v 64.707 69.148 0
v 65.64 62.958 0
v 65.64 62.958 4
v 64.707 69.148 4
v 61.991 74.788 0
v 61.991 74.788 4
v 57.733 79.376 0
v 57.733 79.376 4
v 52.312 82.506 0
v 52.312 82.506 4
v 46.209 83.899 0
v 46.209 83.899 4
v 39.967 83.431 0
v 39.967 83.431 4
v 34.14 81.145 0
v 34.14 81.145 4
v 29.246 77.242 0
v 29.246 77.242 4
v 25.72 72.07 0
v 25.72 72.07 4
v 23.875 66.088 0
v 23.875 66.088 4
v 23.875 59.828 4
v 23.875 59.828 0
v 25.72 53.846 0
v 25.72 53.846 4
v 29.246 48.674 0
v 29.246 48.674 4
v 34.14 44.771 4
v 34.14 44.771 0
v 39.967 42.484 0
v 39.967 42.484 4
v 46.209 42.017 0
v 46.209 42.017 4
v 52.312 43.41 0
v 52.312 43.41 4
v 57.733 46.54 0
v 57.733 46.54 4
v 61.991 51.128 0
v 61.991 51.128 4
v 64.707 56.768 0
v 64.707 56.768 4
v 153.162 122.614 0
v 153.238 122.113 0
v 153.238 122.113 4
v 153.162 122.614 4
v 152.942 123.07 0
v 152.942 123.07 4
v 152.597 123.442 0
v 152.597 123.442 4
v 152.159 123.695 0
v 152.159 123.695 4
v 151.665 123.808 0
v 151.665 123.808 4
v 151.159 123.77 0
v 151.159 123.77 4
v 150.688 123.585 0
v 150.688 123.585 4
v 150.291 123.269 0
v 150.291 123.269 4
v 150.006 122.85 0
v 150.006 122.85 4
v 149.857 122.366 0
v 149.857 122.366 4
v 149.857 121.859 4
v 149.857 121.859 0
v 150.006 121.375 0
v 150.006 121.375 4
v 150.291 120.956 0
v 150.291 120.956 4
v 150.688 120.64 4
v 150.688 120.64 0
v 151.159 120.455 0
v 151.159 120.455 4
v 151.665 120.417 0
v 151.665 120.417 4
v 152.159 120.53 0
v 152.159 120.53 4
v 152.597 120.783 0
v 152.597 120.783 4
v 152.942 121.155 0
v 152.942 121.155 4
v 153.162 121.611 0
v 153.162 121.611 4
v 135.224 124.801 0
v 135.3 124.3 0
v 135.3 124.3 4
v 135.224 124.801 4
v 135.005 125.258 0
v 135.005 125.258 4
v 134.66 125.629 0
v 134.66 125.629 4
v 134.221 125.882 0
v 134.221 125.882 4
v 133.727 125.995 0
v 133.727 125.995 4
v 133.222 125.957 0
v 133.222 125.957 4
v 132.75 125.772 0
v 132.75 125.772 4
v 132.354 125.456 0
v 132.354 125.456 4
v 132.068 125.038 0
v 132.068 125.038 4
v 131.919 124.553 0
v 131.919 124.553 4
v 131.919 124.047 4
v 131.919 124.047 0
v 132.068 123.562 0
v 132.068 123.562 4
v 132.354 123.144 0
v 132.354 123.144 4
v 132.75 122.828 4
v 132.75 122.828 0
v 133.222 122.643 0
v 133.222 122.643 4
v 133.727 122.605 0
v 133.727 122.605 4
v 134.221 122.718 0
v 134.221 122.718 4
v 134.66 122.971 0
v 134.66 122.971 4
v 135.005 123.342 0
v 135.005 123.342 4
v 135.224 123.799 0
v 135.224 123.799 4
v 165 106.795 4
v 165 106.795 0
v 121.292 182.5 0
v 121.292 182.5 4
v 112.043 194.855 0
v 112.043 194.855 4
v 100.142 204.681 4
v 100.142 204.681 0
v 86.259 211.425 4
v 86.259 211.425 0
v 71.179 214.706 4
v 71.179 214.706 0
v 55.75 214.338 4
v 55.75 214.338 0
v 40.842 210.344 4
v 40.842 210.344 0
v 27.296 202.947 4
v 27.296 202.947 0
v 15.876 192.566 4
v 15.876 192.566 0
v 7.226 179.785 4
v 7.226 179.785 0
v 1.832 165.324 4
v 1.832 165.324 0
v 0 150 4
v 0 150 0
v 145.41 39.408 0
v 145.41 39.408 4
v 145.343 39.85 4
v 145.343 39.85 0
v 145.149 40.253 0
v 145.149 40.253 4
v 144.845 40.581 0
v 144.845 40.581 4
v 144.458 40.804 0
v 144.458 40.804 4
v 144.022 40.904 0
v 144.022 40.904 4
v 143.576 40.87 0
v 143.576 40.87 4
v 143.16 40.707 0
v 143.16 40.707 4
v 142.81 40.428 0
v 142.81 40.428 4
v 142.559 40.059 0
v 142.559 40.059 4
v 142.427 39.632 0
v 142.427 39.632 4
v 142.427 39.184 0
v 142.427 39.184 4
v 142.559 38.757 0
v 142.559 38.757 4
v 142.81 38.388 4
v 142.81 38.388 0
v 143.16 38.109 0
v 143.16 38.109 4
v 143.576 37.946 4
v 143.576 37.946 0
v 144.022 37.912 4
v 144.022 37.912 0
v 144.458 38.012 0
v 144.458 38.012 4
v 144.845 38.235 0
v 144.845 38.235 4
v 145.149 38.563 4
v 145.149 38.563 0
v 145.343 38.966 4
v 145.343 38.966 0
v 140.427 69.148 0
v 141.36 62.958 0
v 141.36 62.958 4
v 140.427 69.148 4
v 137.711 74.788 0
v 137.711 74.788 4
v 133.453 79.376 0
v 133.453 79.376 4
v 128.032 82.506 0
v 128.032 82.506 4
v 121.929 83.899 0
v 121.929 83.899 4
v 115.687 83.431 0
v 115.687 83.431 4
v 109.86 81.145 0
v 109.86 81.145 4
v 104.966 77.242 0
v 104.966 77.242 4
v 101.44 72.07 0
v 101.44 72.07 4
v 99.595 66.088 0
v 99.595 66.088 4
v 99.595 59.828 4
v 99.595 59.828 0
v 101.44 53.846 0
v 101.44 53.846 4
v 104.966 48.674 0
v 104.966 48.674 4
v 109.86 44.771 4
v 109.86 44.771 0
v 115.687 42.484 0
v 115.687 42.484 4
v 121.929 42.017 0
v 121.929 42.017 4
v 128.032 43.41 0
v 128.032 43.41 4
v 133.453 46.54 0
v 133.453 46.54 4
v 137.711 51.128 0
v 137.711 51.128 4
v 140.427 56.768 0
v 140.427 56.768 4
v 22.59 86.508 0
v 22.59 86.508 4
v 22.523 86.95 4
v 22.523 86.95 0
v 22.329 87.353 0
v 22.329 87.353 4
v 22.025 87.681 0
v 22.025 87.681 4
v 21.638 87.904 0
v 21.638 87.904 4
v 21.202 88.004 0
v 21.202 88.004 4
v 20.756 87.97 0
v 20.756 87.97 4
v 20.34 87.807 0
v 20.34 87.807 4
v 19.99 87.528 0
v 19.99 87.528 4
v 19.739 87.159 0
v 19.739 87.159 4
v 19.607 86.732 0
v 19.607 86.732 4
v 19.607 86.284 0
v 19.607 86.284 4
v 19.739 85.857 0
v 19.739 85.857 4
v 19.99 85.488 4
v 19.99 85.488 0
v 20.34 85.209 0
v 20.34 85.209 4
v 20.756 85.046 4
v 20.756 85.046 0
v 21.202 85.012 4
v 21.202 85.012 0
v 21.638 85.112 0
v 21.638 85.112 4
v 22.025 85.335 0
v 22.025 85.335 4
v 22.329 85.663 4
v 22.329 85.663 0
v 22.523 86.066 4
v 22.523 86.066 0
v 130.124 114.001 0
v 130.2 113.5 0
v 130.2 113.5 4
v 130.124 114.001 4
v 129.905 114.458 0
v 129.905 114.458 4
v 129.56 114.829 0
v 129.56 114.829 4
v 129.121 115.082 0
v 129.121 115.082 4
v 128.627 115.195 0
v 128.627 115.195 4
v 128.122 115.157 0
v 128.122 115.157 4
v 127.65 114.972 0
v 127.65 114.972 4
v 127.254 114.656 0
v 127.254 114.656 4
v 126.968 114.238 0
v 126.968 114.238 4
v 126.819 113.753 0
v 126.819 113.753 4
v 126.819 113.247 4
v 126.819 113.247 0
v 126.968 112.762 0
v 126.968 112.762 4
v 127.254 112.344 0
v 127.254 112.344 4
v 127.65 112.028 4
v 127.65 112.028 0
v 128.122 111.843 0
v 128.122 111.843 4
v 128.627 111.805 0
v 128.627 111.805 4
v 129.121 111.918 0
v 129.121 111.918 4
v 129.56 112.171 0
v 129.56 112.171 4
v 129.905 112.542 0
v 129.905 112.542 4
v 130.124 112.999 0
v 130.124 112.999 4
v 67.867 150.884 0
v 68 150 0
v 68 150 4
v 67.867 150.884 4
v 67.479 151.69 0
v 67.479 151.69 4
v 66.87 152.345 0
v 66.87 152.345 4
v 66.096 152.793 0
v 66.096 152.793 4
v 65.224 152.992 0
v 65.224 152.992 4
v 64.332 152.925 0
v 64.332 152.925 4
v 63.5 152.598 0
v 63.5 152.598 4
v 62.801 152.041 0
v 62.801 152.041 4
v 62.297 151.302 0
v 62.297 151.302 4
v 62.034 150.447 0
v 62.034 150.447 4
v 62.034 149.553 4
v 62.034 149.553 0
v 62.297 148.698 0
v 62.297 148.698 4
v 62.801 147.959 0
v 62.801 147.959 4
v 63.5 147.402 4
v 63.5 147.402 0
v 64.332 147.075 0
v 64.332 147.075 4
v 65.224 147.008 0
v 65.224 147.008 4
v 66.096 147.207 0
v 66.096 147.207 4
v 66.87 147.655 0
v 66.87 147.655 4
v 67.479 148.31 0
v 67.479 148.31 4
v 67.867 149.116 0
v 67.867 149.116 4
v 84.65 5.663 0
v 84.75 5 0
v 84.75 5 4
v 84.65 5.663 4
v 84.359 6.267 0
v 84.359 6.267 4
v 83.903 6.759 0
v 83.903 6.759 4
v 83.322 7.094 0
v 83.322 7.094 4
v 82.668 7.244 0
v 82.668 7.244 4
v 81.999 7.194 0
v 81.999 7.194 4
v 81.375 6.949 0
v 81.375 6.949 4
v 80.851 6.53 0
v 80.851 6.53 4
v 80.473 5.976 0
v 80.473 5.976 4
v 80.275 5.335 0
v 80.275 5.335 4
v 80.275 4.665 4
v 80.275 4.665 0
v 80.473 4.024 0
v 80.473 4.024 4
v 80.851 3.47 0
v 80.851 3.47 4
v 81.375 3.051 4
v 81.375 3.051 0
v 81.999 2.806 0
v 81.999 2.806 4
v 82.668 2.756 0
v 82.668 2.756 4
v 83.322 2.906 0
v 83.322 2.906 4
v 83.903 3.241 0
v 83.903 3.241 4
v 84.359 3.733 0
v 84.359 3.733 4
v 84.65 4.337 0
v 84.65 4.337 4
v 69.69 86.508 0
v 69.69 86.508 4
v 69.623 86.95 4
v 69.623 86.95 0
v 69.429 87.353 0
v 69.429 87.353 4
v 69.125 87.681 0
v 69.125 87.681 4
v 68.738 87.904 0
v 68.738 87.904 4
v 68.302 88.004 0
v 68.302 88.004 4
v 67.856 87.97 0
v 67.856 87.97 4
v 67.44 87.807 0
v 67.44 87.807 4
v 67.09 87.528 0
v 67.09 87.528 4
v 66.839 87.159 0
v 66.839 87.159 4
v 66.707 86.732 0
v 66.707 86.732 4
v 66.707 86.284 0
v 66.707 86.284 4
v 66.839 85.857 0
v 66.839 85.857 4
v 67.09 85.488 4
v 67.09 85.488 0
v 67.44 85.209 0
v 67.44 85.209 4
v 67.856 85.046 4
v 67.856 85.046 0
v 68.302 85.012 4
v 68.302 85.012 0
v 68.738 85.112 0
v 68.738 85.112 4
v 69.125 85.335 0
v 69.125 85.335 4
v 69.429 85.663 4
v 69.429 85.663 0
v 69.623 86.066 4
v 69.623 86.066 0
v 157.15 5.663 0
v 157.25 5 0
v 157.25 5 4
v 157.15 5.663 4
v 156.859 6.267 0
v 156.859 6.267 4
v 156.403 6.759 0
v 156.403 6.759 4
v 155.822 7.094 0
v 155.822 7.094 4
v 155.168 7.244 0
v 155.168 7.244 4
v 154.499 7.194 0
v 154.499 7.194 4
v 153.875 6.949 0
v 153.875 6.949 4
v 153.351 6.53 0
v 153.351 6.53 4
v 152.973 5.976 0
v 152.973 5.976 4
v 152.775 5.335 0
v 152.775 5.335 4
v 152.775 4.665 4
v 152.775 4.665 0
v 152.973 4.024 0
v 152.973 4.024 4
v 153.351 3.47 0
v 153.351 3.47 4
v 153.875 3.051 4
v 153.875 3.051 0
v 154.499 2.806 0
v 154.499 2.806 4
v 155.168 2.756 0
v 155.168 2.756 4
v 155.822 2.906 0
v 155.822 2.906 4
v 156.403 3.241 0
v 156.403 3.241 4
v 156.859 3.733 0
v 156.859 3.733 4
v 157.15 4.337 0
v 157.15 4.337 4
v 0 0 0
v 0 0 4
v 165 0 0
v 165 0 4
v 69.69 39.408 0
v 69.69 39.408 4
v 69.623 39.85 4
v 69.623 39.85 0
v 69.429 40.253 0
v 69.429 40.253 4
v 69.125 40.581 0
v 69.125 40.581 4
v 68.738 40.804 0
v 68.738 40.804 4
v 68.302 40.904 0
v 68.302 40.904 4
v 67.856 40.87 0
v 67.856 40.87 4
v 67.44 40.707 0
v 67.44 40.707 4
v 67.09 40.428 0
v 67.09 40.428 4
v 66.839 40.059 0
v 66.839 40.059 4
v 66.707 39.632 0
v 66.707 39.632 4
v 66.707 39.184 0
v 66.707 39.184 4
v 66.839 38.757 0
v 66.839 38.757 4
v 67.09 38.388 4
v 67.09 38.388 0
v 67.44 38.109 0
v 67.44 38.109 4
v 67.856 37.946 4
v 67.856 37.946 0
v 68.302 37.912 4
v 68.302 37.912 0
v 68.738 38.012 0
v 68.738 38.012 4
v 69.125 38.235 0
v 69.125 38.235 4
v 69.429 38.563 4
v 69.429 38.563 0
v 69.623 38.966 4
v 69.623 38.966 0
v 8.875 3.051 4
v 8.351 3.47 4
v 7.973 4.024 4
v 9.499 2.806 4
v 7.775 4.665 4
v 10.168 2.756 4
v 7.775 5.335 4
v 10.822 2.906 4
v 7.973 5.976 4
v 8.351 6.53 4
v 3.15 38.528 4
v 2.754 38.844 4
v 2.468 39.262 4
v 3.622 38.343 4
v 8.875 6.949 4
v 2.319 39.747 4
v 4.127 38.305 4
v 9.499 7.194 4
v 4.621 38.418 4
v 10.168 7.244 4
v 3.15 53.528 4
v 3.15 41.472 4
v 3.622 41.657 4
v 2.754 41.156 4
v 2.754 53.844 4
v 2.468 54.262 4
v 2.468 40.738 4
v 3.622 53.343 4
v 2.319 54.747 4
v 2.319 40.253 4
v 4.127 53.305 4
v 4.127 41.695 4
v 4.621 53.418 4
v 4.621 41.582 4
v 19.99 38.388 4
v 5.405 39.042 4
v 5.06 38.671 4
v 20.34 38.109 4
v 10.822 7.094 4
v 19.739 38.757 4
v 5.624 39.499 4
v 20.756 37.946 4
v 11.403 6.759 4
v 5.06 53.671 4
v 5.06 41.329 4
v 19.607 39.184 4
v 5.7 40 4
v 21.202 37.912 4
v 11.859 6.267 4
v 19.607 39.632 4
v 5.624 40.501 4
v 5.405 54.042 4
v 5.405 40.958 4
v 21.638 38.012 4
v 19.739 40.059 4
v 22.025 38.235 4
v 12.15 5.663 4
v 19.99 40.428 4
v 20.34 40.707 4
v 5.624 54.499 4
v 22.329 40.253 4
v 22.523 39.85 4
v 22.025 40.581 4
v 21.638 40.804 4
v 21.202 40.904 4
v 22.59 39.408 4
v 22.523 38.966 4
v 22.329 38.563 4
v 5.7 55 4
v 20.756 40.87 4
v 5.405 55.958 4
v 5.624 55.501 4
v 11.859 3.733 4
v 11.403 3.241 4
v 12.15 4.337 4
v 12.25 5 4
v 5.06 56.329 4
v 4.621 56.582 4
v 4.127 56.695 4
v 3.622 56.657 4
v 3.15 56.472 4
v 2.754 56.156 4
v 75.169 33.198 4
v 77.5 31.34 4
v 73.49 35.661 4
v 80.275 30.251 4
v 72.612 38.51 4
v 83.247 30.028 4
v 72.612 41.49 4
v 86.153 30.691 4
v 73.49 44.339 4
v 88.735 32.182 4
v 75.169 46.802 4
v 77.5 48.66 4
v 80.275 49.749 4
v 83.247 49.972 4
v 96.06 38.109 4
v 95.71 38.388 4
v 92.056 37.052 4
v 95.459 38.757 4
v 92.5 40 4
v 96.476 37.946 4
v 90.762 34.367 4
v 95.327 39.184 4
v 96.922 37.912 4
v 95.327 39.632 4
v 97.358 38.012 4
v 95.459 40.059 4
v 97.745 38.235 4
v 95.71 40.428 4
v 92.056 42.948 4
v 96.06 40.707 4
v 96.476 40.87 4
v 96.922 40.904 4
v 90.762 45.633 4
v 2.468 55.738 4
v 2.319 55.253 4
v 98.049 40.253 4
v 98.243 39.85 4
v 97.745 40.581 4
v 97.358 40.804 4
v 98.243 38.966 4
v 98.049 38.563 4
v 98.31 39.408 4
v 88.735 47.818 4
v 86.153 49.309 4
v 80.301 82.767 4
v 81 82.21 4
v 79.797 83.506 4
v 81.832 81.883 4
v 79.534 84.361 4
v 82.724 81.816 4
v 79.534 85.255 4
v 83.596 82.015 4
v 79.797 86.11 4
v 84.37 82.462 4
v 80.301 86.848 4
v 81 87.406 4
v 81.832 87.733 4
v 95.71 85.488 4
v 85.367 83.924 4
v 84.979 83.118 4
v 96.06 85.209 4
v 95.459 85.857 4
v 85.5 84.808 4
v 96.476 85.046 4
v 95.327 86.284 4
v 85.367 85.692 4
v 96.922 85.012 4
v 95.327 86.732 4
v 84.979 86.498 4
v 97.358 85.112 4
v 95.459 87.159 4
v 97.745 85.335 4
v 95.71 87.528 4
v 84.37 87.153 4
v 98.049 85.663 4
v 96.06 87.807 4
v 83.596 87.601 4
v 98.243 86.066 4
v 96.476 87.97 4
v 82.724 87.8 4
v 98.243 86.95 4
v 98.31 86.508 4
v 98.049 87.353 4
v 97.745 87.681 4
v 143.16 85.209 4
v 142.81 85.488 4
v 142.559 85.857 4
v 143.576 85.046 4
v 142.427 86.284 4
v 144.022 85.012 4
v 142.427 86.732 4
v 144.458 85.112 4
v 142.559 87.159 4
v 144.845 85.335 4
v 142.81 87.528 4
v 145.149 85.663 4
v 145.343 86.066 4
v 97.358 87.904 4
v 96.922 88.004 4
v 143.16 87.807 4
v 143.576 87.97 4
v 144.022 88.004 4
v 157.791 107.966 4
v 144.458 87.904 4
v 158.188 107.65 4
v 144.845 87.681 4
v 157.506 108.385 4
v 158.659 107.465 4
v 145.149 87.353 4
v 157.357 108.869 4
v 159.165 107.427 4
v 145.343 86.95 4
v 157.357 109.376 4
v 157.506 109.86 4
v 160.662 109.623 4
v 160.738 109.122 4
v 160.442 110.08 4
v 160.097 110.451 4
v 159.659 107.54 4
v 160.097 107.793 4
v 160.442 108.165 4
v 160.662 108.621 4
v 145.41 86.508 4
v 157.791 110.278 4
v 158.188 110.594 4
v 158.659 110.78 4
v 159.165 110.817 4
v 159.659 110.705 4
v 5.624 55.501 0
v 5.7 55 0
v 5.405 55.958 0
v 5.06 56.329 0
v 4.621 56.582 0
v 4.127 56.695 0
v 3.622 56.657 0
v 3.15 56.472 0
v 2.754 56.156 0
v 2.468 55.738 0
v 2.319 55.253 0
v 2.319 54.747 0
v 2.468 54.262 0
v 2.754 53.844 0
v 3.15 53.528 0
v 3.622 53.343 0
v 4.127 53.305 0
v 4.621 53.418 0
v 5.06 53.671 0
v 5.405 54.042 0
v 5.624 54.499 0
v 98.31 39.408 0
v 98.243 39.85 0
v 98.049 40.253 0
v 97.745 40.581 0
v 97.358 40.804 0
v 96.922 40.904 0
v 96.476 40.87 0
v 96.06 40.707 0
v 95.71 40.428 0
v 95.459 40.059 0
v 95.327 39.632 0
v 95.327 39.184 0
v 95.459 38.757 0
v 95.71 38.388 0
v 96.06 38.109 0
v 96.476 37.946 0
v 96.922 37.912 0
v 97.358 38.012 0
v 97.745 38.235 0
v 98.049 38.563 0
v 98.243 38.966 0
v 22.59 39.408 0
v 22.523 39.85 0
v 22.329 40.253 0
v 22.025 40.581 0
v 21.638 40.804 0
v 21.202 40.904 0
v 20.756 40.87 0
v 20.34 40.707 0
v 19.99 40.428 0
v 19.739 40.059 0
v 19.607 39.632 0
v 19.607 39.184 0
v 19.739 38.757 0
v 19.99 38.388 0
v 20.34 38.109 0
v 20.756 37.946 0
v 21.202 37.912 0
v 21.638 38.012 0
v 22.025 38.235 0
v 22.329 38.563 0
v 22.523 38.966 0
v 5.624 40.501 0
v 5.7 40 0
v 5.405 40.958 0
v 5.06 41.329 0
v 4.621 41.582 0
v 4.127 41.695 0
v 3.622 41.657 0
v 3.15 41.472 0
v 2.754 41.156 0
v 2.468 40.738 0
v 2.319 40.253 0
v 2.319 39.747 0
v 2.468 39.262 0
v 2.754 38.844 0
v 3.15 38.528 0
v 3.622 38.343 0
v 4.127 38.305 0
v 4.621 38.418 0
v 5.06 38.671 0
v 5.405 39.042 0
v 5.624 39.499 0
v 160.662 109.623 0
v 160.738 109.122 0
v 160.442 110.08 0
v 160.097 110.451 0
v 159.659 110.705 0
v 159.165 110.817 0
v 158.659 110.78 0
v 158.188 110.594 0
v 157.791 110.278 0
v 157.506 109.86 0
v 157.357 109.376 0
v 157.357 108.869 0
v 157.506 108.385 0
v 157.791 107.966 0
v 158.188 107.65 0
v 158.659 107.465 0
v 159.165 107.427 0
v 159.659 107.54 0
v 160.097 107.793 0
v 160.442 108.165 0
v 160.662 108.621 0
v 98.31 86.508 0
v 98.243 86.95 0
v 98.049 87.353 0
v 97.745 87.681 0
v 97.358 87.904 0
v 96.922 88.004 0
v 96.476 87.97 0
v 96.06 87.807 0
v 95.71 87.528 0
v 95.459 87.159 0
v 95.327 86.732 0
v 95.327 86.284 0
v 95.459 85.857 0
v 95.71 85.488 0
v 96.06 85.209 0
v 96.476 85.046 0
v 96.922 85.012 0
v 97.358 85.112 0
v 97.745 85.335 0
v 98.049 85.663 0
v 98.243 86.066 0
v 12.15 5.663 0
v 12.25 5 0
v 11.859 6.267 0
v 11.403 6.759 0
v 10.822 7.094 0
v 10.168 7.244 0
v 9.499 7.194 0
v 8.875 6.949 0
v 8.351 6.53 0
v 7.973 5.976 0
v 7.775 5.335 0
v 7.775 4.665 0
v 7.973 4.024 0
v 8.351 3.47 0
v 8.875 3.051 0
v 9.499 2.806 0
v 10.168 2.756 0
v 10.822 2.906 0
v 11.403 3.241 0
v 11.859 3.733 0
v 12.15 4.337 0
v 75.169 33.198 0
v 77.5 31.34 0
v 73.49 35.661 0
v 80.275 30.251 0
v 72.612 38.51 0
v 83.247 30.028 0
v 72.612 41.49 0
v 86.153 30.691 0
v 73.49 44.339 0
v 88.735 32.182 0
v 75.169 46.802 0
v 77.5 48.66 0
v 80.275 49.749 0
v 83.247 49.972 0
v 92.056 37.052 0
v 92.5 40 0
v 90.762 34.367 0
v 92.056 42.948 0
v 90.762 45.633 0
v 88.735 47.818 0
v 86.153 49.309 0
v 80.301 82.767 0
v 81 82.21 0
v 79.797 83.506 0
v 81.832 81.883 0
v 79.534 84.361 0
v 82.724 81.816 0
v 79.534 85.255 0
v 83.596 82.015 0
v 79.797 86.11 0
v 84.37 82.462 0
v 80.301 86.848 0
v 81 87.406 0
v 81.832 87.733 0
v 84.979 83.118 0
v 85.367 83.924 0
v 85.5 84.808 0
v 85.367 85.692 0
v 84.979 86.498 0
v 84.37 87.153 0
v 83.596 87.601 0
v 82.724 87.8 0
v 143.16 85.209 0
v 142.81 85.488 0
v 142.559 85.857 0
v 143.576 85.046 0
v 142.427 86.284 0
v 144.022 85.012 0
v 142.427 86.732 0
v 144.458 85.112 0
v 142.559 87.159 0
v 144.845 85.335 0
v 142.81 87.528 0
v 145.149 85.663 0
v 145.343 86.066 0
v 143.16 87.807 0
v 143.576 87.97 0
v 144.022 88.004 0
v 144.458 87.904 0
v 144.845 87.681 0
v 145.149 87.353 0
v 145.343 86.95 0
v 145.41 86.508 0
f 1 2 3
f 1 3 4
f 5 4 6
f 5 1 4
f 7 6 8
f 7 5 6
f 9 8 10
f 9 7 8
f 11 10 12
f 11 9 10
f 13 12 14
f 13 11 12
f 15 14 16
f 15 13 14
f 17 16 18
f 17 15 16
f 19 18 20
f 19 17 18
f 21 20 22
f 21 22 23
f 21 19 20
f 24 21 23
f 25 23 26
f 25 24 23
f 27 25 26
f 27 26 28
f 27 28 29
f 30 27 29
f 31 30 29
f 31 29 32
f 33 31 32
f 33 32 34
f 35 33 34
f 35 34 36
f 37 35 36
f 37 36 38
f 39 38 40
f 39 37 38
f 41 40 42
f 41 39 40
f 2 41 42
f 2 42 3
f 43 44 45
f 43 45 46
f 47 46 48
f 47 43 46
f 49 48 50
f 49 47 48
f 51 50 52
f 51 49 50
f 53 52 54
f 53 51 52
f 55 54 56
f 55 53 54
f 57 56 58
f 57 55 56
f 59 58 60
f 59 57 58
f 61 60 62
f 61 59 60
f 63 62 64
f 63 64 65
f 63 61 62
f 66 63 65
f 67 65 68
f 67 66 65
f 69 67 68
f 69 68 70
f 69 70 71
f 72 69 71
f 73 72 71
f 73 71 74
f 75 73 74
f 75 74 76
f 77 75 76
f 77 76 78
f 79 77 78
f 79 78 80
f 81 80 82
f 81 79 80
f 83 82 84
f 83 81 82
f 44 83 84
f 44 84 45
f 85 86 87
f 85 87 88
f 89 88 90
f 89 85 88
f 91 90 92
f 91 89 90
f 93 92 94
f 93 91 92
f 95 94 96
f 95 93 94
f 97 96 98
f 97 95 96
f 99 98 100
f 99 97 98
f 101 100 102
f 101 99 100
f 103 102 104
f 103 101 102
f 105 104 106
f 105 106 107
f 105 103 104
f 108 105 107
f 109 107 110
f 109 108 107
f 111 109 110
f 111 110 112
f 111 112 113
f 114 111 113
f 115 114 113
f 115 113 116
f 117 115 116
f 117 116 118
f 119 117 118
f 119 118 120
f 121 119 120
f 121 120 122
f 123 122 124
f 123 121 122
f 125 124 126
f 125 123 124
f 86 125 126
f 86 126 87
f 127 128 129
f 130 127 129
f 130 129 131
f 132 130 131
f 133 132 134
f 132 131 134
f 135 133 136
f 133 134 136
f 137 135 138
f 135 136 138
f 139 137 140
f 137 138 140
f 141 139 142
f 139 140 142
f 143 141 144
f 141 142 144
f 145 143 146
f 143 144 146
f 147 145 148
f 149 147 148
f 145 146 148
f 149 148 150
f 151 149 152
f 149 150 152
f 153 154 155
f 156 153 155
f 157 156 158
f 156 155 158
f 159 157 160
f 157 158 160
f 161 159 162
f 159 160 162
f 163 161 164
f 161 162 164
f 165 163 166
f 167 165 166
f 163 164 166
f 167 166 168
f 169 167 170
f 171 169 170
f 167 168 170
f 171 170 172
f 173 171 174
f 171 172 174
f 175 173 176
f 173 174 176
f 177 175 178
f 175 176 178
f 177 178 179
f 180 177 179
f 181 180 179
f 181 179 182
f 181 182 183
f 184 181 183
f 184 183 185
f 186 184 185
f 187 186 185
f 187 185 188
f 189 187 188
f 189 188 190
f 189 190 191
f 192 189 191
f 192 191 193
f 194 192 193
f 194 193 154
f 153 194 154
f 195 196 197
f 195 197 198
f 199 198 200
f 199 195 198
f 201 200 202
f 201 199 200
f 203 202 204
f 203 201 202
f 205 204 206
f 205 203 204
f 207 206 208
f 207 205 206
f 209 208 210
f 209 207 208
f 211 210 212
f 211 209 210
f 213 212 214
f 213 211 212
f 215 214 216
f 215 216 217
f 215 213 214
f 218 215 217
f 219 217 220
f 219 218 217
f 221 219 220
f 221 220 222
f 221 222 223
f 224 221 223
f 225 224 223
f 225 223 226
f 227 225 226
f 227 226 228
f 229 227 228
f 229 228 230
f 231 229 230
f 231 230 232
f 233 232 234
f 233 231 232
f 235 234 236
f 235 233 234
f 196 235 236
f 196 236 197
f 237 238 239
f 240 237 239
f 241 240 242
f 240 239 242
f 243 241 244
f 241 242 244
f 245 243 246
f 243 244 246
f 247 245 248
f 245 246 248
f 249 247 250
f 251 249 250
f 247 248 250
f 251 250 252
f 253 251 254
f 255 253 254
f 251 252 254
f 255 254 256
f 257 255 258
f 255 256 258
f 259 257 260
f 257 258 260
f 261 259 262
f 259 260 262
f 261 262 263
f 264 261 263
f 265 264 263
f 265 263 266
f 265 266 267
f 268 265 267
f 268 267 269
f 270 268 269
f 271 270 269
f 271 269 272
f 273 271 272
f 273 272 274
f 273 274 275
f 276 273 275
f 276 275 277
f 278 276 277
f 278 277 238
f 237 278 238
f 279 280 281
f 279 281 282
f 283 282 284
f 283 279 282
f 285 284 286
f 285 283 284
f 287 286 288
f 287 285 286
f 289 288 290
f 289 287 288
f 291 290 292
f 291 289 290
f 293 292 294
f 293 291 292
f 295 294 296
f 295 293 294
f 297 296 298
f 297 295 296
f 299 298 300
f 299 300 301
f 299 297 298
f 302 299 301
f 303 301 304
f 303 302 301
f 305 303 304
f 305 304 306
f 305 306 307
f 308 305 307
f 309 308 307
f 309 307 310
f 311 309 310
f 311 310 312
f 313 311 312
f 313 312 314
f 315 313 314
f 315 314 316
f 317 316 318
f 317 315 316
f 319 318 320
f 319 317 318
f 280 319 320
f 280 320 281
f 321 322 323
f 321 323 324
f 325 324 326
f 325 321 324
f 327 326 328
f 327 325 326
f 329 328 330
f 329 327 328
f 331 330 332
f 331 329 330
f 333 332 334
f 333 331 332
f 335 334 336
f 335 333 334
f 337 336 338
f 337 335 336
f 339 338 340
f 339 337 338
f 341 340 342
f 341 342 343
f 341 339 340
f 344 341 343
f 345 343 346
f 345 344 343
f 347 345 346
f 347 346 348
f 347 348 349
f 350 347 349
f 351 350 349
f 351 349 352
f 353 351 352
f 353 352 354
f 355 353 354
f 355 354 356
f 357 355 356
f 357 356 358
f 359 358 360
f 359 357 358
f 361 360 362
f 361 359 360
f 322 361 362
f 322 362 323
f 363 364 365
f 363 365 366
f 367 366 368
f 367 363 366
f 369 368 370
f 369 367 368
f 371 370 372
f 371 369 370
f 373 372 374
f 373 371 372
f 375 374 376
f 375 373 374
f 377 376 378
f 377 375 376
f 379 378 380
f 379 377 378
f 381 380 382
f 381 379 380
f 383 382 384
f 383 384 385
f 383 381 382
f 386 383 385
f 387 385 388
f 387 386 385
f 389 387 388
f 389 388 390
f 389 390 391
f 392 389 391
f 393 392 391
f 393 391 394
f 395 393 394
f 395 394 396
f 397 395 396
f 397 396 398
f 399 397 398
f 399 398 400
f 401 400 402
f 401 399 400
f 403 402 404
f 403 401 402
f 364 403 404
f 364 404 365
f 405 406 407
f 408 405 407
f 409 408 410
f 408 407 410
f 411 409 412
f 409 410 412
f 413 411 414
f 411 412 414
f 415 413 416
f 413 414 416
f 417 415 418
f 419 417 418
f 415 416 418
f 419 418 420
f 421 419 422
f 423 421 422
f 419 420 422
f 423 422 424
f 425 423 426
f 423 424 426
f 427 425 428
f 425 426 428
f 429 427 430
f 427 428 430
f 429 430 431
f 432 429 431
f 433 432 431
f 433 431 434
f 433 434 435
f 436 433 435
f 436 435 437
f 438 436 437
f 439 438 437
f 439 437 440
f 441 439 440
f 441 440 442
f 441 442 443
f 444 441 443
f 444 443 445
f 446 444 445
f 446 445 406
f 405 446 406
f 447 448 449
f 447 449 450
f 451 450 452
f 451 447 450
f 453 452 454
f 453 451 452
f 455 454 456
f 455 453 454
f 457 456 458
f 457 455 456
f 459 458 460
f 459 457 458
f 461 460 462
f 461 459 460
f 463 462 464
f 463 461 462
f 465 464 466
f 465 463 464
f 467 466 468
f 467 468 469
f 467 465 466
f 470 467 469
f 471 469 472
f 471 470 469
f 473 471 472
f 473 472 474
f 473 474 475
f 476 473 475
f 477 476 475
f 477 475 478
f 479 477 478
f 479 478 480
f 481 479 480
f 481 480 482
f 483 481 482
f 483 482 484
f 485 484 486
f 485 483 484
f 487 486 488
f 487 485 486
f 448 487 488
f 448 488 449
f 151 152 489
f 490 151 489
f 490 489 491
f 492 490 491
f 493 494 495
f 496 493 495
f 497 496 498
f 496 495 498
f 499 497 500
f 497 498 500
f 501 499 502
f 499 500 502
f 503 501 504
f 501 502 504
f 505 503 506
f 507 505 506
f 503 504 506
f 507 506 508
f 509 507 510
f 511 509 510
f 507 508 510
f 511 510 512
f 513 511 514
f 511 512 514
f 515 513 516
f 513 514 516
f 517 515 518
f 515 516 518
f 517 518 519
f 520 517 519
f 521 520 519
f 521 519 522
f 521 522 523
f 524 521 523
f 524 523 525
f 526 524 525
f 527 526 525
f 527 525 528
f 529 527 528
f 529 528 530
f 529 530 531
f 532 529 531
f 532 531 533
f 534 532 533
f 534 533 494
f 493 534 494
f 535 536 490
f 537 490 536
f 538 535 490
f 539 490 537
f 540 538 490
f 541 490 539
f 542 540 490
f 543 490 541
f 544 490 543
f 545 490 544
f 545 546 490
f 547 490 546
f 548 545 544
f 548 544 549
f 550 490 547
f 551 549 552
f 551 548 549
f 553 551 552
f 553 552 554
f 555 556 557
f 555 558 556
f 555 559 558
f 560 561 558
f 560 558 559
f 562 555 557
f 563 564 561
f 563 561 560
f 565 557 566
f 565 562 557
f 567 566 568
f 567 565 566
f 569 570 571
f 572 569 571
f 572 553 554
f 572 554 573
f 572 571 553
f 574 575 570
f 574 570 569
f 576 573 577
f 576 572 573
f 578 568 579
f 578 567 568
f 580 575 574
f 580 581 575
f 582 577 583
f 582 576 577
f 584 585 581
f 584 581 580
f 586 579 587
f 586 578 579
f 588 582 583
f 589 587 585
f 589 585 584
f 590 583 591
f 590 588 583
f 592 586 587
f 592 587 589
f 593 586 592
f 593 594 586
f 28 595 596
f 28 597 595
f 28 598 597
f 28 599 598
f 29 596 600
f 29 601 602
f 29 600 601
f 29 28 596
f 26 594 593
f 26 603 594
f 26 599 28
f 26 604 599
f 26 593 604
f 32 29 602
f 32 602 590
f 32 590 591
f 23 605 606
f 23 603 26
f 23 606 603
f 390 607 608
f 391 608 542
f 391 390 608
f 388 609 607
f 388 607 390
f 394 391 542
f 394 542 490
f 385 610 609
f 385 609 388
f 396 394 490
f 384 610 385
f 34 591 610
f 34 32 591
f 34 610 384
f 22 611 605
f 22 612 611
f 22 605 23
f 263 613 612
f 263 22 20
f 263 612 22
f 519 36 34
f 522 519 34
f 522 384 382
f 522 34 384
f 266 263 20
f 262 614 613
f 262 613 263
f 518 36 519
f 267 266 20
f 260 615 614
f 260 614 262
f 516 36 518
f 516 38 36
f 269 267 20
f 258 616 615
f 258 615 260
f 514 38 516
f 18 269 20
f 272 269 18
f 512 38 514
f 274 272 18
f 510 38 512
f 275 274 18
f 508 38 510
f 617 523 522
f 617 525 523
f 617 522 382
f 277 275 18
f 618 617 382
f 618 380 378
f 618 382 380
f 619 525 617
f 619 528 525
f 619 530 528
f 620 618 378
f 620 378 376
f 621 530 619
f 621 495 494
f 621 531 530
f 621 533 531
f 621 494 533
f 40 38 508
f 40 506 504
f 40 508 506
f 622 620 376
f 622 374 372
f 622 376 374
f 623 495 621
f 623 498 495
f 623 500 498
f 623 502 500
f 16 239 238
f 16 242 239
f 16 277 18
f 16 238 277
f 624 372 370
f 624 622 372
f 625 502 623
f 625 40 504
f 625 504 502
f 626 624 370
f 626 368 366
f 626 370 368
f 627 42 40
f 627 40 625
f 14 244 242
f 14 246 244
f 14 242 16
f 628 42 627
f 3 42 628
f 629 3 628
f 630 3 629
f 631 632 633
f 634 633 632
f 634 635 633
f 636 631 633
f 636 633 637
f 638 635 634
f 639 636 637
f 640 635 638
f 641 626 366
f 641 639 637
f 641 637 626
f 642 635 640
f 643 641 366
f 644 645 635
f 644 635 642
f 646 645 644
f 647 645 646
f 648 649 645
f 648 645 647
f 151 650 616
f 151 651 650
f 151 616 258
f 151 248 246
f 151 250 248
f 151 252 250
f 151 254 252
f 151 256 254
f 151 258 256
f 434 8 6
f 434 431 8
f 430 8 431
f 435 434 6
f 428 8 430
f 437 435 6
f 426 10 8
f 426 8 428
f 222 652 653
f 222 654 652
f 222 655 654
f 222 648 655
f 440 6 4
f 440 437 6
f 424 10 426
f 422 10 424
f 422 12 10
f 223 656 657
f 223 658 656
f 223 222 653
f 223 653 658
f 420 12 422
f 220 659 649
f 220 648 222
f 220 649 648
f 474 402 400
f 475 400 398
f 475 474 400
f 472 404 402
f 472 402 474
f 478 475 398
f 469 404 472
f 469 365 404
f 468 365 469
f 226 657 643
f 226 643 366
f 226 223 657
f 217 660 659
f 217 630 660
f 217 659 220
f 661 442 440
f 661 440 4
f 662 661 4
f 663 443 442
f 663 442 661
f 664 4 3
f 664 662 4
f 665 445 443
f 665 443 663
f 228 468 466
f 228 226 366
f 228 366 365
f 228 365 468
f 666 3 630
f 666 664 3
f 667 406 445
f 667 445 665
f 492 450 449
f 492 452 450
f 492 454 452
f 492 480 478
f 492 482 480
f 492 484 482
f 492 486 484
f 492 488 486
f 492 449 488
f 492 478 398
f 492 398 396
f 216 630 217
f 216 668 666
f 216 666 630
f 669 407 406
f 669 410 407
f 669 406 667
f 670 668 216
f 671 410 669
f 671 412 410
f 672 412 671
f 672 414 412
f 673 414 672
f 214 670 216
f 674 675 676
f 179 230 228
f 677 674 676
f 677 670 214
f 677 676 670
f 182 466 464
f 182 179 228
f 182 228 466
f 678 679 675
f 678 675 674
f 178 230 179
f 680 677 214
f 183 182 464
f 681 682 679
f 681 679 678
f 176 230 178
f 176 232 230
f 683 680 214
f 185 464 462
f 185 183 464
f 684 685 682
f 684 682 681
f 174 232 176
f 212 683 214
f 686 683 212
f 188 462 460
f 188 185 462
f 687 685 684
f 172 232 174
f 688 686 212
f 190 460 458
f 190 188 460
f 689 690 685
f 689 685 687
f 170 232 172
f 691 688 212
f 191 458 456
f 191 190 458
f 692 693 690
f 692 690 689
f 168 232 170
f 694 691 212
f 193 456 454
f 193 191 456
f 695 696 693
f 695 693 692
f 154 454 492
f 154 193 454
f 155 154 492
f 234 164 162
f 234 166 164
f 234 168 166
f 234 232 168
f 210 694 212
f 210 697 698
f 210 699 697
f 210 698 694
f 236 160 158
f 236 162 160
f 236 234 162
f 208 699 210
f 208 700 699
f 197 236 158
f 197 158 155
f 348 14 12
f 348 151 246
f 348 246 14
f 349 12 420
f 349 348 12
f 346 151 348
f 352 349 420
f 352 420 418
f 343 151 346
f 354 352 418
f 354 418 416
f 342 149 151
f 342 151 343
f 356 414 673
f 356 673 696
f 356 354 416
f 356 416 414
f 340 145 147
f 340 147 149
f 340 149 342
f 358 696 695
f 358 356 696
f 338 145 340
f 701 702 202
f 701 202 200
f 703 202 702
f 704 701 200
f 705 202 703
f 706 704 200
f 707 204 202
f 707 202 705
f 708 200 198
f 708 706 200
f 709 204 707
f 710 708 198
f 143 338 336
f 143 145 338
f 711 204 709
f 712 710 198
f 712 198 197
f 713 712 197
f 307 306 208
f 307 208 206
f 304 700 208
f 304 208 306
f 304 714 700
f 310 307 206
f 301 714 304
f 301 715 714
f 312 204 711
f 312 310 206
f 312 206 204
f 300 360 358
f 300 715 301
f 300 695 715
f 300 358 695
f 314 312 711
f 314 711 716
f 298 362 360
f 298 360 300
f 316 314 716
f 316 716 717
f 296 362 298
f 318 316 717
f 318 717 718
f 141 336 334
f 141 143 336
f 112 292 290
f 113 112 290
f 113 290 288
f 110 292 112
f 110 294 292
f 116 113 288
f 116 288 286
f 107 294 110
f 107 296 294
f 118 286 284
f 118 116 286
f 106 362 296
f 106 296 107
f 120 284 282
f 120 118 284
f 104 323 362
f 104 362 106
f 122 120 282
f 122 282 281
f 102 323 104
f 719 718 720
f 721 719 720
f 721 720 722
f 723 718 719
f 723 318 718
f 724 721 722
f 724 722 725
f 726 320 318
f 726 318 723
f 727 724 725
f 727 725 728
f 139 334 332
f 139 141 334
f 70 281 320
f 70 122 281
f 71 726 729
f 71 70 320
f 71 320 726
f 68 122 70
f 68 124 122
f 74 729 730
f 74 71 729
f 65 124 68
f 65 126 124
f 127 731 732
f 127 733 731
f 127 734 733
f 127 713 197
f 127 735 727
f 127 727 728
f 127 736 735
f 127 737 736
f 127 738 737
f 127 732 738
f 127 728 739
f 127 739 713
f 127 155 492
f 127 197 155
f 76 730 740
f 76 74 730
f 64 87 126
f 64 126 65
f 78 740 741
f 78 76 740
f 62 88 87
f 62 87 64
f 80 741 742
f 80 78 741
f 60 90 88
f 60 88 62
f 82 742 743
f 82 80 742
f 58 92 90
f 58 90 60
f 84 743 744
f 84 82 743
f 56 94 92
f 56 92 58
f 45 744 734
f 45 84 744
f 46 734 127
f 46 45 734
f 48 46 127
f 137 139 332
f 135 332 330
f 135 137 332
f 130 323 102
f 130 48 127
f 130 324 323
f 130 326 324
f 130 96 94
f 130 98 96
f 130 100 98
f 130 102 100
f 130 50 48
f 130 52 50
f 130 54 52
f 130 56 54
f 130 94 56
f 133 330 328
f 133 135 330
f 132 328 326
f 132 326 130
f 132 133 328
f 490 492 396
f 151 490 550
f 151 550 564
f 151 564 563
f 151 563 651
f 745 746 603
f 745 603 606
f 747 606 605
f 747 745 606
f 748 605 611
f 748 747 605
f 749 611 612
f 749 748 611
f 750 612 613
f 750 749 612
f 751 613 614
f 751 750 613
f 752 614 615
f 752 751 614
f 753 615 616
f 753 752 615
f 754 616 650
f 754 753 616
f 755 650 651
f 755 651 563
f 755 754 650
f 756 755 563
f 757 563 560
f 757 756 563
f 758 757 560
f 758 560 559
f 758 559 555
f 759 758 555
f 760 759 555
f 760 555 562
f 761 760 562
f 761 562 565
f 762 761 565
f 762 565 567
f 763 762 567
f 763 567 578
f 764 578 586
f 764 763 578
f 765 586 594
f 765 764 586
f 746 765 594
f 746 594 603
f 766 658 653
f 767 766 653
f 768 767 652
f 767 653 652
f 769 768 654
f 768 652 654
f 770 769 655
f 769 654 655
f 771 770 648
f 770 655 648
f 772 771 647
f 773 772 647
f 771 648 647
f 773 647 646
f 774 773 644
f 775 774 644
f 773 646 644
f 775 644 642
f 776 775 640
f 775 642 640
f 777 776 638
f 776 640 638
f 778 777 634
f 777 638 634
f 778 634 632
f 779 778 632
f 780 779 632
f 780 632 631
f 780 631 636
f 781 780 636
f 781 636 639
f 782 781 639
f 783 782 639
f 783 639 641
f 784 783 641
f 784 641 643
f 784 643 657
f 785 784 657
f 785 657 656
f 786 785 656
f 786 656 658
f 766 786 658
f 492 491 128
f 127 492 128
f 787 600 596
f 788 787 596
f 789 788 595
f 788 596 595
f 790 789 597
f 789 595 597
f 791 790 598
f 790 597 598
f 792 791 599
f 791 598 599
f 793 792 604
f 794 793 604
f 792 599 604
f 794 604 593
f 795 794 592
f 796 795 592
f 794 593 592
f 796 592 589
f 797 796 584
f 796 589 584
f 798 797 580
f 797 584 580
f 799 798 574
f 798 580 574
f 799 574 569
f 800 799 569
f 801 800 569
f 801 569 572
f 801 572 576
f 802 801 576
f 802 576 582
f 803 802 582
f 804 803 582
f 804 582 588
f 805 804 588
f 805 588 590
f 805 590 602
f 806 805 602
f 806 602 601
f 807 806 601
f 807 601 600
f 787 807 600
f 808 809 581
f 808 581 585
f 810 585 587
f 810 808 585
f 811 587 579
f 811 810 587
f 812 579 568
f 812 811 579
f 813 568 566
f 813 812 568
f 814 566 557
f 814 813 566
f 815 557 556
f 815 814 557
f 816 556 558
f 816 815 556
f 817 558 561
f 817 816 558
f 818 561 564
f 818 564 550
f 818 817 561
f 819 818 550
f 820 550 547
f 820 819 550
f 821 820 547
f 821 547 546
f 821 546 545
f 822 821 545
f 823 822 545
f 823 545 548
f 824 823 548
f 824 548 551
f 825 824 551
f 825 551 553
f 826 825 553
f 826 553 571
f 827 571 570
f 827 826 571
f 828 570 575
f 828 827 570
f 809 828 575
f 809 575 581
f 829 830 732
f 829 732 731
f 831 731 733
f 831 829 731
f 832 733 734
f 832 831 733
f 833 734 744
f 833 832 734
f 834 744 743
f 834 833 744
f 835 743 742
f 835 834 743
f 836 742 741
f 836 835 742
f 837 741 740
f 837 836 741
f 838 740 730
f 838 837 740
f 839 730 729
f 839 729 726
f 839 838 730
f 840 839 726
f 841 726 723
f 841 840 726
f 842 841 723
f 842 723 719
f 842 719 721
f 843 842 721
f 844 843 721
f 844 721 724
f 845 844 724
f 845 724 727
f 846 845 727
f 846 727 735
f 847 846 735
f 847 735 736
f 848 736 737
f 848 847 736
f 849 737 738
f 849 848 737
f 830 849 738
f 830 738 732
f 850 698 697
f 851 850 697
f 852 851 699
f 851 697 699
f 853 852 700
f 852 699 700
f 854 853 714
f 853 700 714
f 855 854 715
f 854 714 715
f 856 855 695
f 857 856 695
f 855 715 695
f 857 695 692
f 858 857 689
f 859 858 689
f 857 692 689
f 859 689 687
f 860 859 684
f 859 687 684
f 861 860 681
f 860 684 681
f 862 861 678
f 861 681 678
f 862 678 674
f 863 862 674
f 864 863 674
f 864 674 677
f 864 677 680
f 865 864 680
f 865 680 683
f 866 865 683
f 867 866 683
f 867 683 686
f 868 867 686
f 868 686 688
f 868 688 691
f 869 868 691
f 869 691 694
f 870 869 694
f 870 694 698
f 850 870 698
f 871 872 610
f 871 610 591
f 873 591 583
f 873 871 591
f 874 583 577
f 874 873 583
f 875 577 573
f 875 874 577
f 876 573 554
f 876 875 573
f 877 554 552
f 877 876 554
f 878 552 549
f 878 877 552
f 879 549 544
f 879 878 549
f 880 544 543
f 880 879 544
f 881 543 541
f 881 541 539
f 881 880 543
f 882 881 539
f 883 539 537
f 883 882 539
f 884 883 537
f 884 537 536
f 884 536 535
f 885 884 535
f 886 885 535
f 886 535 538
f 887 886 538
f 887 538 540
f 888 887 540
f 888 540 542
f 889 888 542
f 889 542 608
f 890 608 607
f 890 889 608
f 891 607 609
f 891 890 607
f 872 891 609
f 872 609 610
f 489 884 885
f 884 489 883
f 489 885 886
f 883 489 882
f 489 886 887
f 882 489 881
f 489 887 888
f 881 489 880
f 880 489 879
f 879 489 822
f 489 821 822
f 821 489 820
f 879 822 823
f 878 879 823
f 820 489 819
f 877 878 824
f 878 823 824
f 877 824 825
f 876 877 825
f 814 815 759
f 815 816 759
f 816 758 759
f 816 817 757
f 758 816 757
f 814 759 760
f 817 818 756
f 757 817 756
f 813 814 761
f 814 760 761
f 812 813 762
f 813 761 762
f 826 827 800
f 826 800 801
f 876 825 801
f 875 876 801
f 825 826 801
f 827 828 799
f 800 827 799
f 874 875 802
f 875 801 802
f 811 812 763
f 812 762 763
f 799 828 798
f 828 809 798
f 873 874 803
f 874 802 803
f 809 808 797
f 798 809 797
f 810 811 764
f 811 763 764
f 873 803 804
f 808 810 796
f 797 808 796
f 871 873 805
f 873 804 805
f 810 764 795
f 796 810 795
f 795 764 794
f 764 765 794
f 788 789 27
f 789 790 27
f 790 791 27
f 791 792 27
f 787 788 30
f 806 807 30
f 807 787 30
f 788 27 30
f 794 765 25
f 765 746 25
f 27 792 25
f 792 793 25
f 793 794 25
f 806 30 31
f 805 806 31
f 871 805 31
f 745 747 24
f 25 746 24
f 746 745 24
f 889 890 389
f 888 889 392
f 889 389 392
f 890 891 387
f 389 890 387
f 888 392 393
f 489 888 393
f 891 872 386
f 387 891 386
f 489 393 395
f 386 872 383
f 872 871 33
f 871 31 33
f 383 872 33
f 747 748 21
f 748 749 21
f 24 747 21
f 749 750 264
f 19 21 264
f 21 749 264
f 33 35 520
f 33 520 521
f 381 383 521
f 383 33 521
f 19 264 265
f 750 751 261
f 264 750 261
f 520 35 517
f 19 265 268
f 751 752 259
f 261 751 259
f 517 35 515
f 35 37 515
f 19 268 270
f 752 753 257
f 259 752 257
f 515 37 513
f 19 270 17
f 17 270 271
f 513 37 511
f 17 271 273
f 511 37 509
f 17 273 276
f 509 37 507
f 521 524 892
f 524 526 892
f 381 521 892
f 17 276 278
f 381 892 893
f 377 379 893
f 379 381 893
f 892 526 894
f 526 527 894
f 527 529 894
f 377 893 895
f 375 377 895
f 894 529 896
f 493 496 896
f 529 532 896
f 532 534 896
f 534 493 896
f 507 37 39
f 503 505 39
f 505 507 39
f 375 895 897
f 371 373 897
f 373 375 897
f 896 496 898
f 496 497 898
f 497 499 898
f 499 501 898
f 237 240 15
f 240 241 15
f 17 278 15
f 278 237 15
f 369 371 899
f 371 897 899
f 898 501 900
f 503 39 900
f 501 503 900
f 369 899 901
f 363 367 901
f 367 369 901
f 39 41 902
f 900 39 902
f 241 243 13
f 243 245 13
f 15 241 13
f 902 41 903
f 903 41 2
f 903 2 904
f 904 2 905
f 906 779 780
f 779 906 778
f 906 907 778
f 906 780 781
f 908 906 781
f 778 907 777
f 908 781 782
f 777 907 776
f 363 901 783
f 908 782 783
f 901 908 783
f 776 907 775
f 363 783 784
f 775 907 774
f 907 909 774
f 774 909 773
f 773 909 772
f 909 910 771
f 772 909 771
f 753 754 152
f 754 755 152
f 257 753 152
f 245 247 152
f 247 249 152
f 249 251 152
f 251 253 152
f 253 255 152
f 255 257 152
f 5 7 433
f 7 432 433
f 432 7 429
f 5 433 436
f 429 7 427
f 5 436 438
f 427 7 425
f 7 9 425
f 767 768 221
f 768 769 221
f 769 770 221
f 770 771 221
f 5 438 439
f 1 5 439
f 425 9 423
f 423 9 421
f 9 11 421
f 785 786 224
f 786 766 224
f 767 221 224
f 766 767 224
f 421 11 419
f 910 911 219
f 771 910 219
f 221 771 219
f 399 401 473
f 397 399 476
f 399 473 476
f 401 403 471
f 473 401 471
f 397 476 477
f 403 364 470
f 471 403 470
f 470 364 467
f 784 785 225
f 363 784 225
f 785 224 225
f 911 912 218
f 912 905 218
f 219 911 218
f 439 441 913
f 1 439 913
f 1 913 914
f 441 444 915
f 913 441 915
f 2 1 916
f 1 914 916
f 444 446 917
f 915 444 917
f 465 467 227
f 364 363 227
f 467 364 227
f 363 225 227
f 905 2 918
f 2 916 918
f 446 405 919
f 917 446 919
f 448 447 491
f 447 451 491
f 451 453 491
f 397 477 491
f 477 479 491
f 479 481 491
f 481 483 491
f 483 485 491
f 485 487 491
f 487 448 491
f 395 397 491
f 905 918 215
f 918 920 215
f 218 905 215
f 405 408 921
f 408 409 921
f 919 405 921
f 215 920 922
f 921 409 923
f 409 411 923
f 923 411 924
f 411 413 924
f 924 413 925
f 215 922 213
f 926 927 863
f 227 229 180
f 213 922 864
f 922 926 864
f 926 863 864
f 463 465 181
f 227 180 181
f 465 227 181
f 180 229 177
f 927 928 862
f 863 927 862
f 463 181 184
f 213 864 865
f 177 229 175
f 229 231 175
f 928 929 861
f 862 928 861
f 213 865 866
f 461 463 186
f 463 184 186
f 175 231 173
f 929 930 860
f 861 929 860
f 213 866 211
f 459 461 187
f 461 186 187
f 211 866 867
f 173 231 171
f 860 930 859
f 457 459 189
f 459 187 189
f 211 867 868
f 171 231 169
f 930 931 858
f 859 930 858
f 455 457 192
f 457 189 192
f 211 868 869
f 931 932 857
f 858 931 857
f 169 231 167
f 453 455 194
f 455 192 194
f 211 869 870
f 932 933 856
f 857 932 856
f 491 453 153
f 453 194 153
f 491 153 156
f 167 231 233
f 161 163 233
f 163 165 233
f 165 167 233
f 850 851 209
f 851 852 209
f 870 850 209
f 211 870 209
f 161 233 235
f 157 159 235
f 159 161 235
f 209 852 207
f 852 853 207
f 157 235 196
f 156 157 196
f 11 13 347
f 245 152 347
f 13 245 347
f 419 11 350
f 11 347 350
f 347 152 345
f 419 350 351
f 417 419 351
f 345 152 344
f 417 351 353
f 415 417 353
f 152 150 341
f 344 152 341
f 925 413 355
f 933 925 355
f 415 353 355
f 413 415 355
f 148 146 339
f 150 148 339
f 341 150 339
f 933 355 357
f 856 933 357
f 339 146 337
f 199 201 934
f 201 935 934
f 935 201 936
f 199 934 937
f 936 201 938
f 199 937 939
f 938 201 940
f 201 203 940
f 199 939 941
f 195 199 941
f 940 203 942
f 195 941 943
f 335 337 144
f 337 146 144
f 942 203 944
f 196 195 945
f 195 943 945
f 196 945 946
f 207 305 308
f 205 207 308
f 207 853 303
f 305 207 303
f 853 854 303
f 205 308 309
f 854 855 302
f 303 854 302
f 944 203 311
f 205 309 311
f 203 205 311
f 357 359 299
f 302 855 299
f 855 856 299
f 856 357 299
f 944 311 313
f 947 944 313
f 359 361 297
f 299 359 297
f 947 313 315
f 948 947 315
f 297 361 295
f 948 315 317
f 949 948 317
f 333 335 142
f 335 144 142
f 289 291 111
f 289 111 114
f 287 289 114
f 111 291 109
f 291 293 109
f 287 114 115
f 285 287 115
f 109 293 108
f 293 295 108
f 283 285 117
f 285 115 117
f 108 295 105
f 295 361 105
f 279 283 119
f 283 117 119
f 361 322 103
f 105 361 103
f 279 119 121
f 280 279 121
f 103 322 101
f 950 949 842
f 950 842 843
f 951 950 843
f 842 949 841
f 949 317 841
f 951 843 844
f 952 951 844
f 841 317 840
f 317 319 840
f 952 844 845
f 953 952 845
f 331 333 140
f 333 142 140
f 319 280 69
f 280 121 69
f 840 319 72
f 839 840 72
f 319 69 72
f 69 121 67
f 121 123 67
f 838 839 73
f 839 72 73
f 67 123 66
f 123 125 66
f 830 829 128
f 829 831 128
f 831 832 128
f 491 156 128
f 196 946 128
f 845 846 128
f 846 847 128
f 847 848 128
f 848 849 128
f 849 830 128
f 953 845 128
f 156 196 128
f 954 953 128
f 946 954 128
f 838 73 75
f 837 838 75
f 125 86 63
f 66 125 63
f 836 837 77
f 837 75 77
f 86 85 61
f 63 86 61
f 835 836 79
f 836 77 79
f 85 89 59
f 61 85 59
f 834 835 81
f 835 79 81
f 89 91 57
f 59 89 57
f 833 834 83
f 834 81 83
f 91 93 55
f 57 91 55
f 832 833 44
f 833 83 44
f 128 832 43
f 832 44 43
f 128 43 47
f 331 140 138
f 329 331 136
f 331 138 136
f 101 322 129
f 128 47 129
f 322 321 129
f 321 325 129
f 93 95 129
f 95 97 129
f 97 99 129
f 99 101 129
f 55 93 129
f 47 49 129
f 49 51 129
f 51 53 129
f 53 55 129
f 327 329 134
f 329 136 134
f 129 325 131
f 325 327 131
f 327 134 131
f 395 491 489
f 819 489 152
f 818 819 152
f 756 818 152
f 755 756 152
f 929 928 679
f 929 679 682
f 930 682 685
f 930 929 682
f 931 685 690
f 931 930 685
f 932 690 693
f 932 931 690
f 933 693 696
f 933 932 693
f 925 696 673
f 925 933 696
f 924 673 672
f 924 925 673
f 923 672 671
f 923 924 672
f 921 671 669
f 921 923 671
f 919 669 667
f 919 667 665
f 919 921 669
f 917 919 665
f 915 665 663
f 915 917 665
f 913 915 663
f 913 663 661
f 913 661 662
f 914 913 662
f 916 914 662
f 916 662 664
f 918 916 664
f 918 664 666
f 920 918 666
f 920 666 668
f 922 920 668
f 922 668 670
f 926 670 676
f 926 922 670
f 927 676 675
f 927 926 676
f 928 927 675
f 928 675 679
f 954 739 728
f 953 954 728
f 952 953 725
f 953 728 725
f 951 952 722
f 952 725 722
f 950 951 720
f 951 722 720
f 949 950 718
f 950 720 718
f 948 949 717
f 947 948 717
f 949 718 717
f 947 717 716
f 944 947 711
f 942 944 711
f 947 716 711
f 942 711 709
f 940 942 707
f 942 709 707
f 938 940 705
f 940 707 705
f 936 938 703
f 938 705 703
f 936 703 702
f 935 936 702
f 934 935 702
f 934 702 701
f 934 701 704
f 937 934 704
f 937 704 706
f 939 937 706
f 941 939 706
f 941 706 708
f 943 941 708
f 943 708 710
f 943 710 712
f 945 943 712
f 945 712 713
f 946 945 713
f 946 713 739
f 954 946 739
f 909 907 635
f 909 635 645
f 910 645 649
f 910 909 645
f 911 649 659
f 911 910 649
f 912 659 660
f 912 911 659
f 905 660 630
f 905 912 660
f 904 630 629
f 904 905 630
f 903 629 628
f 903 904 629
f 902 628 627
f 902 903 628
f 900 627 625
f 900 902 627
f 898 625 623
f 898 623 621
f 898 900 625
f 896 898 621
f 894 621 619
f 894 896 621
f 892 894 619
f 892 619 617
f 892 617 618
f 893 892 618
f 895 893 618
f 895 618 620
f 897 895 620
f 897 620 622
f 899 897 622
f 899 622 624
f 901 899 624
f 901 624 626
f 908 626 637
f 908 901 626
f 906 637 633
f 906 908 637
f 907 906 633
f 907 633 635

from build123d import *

# Parameters (mm, degrees)
ESQUISSE1_R                     = 3
ESQUISSE1_R_2                   = 10
ESQUISSE1_R_3                   = 2.25
ESQUISSE1_R_4                   = 1.7
ESQUISSE1_R_5                   = 21
BASE_EXTRUSION_DEPTH            = 4
ESQUISSE2_R                     = 1.5
ENL_V_MAT_EXTRU_1_DEPTH         = 272.046121537
R_P_TITION_LIN_AIRE1_COUNT      = 2
R_P_TITION_LIN_AIRE1_PITCH      = 47.1
R_P_TITION_LIN_AIRE1_COUNT_DIR2 = 2
R_P_TITION_LIN_AIRE1_PITCH_DIR2 = 47.1
ESQUISSE3_R                     = 1.5
ENL_V_MAT_EXTRU_2_DEPTH         = 234.557566427
R_P_TITION_LIN_AIRE2_COUNT      = 2
R_P_TITION_LIN_AIRE2_PITCH      = 47.1
R_P_TITION_LIN_AIRE2_COUNT_DIR2 = 2
R_P_TITION_LIN_AIRE2_PITCH_DIR2 = 47.1


with BuildPart() as part:
    # Esquisse1 → Base-Extrusion (new body)
    with BuildSketch(Plane.XY):
        with BuildLine():
            Line((0, 0), (165, 0))
            Line((165, 0), (165, 106.794919243))
            Line((165, 106.794919243), (121.291651246, 182.5))
            ThreePointArc((121.291651246, 182.5), (48.176762068, 212.785178709), (0, 150))
            Line((0, 150), (0, 0))
        make_face()
        with Locations((65, 150)):
            Circle(ESQUISSE1_R, mode=Mode.SUBTRACT)
        with Locations((82.5, 40)):
            Circle(ESQUISSE1_R_2, mode=Mode.SUBTRACT)
        with Locations((82.5, 5)):
            Circle(ESQUISSE1_R_3, mode=Mode.SUBTRACT)
        with Locations((10, 5)):
            Circle(ESQUISSE1_R_3, mode=Mode.SUBTRACT)
        with Locations((155, 5)):
            Circle(ESQUISSE1_R_3, mode=Mode.SUBTRACT)
        with Locations((4, 40)):
            Circle(ESQUISSE1_R_4, mode=Mode.SUBTRACT)
        with Locations((4, 55)):
            Circle(ESQUISSE1_R_4, mode=Mode.SUBTRACT)
        with Locations((82.5, 84.807975948)):
            Circle(ESQUISSE1_R, mode=Mode.SUBTRACT)
        with Locations((44.64, 62.957975948)):
            Circle(ESQUISSE1_R_5, mode=Mode.SUBTRACT)
        with Locations((120.36, 62.957975948)):
            Circle(ESQUISSE1_R_5, mode=Mode.SUBTRACT)
        with Locations((151.537549631, 122.112567277)):
            Circle(ESQUISSE1_R_4, mode=Mode.SUBTRACT)
        with Locations((159.037549631, 109.12218622)):
            Circle(ESQUISSE1_R_4, mode=Mode.SUBTRACT)
        with Locations((128.5, 113.5)):
            Circle(ESQUISSE1_R_4, mode=Mode.SUBTRACT)
        with Locations((133.6, 124.3)):
            Circle(ESQUISSE1_R_4, mode=Mode.SUBTRACT)
    extrude(amount=BASE_EXTRUSION_DEPTH)

    # Esquisse2 → Enlèv. mat.-Extru.1 (cut, through all)
    with BuildSketch(Plane.XY.offset(4)):
        with Locations((21.09, 86.507975948)):
            Circle(ESQUISSE2_R)
    enl_v_mat_extru_1 = extrude(amount=-ENL_V_MAT_EXTRU_1_DEPTH, mode=Mode.SUBTRACT)

    # Répétition linéaire1: Enl_v. mat.-Extru.1 2 × 2
    with Locations(*[(i * R_P_TITION_LIN_AIRE1_PITCH, -j * R_P_TITION_LIN_AIRE1_PITCH_DIR2, 0) for i in range(R_P_TITION_LIN_AIRE1_COUNT) for j in range(R_P_TITION_LIN_AIRE1_COUNT_DIR2) if (i, j) != (0, 0)]):
        add(enl_v_mat_extru_1, mode=Mode.SUBTRACT)

    # Esquisse3 → Enlèv. mat.-Extru.2 (cut, through all)
    with BuildSketch(Plane(origin=(31.548888889, 23.365092485, 4), x_dir=(1, 0, 0), z_dir=(0, 0, 1))):
        with Locations((65.261111111, 63.142883463)):
            Circle(ESQUISSE3_R)
    enl_v_mat_extru_2 = extrude(amount=-ENL_V_MAT_EXTRU_2_DEPTH, mode=Mode.SUBTRACT)

    # Répétition linéaire2: Enl_v. mat.-Extru.2 2 × 2
    with Locations(*[(i * R_P_TITION_LIN_AIRE2_PITCH, -j * R_P_TITION_LIN_AIRE2_PITCH_DIR2, 0) for i in range(R_P_TITION_LIN_AIRE2_COUNT) for j in range(R_P_TITION_LIN_AIRE2_COUNT_DIR2) if (i, j) != (0, 0)]):
        add(enl_v_mat_extru_2, mode=Mode.SUBTRACT)


solid = part.part
